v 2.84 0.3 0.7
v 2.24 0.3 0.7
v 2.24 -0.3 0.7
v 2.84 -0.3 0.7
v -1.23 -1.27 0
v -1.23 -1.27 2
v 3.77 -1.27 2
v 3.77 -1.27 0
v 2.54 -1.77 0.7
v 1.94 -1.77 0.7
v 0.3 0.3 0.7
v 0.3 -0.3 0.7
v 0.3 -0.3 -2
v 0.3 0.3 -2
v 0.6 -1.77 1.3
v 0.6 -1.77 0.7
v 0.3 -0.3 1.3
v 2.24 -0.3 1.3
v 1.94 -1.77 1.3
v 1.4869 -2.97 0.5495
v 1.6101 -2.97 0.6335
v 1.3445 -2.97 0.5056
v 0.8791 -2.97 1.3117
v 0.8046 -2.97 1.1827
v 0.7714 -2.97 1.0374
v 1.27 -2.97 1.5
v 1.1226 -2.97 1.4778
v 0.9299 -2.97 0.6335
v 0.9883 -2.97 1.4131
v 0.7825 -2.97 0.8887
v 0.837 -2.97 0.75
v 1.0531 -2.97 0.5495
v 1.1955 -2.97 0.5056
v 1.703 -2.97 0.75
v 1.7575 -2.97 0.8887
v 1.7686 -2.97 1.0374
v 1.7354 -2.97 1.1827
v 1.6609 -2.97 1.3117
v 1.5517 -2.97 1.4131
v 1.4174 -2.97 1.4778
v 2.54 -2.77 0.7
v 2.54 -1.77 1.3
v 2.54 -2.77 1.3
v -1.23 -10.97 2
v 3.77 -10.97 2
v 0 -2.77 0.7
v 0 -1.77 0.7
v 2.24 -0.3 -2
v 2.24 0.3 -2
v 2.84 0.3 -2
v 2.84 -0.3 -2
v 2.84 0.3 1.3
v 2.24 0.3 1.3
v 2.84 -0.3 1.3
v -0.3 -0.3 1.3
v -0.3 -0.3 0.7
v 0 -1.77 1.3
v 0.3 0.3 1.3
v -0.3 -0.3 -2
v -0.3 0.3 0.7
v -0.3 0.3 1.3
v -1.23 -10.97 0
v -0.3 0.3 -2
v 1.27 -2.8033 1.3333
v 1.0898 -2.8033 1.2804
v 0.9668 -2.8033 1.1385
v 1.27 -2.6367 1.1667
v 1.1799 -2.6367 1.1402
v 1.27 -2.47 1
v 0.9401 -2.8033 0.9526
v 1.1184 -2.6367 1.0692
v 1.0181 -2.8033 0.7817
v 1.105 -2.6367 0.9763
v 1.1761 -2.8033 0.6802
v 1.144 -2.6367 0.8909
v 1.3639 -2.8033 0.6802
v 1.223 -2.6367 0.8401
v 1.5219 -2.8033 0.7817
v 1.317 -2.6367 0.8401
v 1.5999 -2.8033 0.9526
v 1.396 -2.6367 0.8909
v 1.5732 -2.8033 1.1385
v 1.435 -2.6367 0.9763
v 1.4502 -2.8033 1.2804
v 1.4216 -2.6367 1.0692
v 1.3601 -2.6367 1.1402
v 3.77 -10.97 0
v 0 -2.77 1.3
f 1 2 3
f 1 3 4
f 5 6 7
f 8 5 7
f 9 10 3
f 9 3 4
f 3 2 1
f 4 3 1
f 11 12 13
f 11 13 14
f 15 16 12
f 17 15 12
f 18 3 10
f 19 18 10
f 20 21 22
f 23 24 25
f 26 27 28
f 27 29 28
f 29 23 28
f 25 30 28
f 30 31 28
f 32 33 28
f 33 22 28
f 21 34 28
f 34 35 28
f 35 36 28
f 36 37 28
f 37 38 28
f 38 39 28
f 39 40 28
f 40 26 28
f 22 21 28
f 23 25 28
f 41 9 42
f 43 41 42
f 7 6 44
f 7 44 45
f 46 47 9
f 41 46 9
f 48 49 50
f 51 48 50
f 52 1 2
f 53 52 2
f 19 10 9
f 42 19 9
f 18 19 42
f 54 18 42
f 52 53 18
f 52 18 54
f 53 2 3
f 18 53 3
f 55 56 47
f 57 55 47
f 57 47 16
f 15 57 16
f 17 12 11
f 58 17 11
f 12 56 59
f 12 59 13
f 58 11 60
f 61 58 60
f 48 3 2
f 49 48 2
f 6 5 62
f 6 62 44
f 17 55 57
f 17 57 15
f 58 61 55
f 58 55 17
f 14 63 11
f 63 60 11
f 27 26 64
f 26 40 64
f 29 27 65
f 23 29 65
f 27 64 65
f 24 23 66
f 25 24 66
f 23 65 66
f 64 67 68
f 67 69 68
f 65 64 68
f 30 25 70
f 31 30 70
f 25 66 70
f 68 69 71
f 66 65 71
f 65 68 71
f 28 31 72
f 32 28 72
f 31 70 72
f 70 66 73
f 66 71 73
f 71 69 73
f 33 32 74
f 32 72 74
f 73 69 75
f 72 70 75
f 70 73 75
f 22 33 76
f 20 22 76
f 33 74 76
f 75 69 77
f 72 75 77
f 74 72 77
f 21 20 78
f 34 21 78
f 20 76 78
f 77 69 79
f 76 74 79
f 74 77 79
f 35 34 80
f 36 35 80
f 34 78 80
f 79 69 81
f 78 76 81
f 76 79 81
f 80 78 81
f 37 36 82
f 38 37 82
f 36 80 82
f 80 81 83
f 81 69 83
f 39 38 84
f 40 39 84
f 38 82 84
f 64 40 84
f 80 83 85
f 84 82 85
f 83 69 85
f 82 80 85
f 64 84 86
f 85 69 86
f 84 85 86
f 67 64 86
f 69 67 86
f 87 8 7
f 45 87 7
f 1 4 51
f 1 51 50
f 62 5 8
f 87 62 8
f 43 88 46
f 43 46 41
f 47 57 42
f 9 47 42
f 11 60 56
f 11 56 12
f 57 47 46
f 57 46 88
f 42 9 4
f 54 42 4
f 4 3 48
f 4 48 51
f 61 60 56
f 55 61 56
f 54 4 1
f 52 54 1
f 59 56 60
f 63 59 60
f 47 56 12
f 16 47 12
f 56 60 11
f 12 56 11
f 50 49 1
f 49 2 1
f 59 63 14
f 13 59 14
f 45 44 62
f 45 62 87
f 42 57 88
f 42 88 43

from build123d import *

# Parameters (mm, degrees)
SKETCH_W       = 0.6
SKETCH_H       = 0.6
PAD_DEPTH      = 0.7
PAD_DEPTH_BACK = 2
PAD001_DEPTH   = 0.6
SKETCH002_W    = 2.54
SKETCH002_H    = 0.6
PAD002_DEPTH   = 1
SKETCH004_W    = 5
SKETCH004_H    = 2
PAD003_DEPTH   = 9.7


with BuildPart() as pad:
    # Sketch → Pad (new body, two sides)
    with BuildSketch(Plane.XY) as pad_sk:
        Rectangle(SKETCH_W, SKETCH_H)
        with Locations((2.54, 0)):
            Rectangle(SKETCH_W, SKETCH_H)
    extrude(amount=PAD_DEPTH)
    extrude(pad_sk.sketch, amount=-PAD_DEPTH_BACK)


with BuildPart() as pad001:
    # Sketch001 → Pad001 (new body)
    with BuildSketch(Plane.XY.offset(0.7)):
        Polygon((0.3, 0.3), (-0.3, 0.3), (-0.3, -0.3), (0, -1.77), (0.6, -1.77), (0.3, -0.3), align=None)
        Polygon((2.84, 0.3), (2.24, 0.3), (2.24, -0.3), (1.94, -1.77), (2.54, -1.77), (2.84, -0.3), align=None)
    extrude(amount=PAD001_DEPTH)


with BuildPart() as pad002:
    # Sketch002 → Pad002 (new body)
    with BuildSketch(Plane.XZ.offset(1.77)):
        with Locations((1.27, 1)):
            Rectangle(SKETCH002_W, SKETCH002_H)
    extrude(amount=PAD002_DEPTH)


with BuildPart() as pad003:
    # Sketch004 → Pad003 (new body)
    with BuildSketch(Plane.XZ.offset(1.27)):
        with Locations((1.27, 1)):
            Rectangle(SKETCH004_W, SKETCH004_H)
    extrude(amount=PAD003_DEPTH)


with BuildPart() as revolution001:
    # Sketch005 → Revolution001 (revolve)
    with BuildSketch(Plane.YZ.offset(1.27)):
        Polygon((-2.47, 1), (-2.97, 1), (-2.97, 1.5), align=None)
    revolve(axis=Axis((1.27, -3.977201, 1), (0, -1, 0)))


solid = Compound([pad.part, pad001.part, pad002.part, pad003.part, revolution001.part])
